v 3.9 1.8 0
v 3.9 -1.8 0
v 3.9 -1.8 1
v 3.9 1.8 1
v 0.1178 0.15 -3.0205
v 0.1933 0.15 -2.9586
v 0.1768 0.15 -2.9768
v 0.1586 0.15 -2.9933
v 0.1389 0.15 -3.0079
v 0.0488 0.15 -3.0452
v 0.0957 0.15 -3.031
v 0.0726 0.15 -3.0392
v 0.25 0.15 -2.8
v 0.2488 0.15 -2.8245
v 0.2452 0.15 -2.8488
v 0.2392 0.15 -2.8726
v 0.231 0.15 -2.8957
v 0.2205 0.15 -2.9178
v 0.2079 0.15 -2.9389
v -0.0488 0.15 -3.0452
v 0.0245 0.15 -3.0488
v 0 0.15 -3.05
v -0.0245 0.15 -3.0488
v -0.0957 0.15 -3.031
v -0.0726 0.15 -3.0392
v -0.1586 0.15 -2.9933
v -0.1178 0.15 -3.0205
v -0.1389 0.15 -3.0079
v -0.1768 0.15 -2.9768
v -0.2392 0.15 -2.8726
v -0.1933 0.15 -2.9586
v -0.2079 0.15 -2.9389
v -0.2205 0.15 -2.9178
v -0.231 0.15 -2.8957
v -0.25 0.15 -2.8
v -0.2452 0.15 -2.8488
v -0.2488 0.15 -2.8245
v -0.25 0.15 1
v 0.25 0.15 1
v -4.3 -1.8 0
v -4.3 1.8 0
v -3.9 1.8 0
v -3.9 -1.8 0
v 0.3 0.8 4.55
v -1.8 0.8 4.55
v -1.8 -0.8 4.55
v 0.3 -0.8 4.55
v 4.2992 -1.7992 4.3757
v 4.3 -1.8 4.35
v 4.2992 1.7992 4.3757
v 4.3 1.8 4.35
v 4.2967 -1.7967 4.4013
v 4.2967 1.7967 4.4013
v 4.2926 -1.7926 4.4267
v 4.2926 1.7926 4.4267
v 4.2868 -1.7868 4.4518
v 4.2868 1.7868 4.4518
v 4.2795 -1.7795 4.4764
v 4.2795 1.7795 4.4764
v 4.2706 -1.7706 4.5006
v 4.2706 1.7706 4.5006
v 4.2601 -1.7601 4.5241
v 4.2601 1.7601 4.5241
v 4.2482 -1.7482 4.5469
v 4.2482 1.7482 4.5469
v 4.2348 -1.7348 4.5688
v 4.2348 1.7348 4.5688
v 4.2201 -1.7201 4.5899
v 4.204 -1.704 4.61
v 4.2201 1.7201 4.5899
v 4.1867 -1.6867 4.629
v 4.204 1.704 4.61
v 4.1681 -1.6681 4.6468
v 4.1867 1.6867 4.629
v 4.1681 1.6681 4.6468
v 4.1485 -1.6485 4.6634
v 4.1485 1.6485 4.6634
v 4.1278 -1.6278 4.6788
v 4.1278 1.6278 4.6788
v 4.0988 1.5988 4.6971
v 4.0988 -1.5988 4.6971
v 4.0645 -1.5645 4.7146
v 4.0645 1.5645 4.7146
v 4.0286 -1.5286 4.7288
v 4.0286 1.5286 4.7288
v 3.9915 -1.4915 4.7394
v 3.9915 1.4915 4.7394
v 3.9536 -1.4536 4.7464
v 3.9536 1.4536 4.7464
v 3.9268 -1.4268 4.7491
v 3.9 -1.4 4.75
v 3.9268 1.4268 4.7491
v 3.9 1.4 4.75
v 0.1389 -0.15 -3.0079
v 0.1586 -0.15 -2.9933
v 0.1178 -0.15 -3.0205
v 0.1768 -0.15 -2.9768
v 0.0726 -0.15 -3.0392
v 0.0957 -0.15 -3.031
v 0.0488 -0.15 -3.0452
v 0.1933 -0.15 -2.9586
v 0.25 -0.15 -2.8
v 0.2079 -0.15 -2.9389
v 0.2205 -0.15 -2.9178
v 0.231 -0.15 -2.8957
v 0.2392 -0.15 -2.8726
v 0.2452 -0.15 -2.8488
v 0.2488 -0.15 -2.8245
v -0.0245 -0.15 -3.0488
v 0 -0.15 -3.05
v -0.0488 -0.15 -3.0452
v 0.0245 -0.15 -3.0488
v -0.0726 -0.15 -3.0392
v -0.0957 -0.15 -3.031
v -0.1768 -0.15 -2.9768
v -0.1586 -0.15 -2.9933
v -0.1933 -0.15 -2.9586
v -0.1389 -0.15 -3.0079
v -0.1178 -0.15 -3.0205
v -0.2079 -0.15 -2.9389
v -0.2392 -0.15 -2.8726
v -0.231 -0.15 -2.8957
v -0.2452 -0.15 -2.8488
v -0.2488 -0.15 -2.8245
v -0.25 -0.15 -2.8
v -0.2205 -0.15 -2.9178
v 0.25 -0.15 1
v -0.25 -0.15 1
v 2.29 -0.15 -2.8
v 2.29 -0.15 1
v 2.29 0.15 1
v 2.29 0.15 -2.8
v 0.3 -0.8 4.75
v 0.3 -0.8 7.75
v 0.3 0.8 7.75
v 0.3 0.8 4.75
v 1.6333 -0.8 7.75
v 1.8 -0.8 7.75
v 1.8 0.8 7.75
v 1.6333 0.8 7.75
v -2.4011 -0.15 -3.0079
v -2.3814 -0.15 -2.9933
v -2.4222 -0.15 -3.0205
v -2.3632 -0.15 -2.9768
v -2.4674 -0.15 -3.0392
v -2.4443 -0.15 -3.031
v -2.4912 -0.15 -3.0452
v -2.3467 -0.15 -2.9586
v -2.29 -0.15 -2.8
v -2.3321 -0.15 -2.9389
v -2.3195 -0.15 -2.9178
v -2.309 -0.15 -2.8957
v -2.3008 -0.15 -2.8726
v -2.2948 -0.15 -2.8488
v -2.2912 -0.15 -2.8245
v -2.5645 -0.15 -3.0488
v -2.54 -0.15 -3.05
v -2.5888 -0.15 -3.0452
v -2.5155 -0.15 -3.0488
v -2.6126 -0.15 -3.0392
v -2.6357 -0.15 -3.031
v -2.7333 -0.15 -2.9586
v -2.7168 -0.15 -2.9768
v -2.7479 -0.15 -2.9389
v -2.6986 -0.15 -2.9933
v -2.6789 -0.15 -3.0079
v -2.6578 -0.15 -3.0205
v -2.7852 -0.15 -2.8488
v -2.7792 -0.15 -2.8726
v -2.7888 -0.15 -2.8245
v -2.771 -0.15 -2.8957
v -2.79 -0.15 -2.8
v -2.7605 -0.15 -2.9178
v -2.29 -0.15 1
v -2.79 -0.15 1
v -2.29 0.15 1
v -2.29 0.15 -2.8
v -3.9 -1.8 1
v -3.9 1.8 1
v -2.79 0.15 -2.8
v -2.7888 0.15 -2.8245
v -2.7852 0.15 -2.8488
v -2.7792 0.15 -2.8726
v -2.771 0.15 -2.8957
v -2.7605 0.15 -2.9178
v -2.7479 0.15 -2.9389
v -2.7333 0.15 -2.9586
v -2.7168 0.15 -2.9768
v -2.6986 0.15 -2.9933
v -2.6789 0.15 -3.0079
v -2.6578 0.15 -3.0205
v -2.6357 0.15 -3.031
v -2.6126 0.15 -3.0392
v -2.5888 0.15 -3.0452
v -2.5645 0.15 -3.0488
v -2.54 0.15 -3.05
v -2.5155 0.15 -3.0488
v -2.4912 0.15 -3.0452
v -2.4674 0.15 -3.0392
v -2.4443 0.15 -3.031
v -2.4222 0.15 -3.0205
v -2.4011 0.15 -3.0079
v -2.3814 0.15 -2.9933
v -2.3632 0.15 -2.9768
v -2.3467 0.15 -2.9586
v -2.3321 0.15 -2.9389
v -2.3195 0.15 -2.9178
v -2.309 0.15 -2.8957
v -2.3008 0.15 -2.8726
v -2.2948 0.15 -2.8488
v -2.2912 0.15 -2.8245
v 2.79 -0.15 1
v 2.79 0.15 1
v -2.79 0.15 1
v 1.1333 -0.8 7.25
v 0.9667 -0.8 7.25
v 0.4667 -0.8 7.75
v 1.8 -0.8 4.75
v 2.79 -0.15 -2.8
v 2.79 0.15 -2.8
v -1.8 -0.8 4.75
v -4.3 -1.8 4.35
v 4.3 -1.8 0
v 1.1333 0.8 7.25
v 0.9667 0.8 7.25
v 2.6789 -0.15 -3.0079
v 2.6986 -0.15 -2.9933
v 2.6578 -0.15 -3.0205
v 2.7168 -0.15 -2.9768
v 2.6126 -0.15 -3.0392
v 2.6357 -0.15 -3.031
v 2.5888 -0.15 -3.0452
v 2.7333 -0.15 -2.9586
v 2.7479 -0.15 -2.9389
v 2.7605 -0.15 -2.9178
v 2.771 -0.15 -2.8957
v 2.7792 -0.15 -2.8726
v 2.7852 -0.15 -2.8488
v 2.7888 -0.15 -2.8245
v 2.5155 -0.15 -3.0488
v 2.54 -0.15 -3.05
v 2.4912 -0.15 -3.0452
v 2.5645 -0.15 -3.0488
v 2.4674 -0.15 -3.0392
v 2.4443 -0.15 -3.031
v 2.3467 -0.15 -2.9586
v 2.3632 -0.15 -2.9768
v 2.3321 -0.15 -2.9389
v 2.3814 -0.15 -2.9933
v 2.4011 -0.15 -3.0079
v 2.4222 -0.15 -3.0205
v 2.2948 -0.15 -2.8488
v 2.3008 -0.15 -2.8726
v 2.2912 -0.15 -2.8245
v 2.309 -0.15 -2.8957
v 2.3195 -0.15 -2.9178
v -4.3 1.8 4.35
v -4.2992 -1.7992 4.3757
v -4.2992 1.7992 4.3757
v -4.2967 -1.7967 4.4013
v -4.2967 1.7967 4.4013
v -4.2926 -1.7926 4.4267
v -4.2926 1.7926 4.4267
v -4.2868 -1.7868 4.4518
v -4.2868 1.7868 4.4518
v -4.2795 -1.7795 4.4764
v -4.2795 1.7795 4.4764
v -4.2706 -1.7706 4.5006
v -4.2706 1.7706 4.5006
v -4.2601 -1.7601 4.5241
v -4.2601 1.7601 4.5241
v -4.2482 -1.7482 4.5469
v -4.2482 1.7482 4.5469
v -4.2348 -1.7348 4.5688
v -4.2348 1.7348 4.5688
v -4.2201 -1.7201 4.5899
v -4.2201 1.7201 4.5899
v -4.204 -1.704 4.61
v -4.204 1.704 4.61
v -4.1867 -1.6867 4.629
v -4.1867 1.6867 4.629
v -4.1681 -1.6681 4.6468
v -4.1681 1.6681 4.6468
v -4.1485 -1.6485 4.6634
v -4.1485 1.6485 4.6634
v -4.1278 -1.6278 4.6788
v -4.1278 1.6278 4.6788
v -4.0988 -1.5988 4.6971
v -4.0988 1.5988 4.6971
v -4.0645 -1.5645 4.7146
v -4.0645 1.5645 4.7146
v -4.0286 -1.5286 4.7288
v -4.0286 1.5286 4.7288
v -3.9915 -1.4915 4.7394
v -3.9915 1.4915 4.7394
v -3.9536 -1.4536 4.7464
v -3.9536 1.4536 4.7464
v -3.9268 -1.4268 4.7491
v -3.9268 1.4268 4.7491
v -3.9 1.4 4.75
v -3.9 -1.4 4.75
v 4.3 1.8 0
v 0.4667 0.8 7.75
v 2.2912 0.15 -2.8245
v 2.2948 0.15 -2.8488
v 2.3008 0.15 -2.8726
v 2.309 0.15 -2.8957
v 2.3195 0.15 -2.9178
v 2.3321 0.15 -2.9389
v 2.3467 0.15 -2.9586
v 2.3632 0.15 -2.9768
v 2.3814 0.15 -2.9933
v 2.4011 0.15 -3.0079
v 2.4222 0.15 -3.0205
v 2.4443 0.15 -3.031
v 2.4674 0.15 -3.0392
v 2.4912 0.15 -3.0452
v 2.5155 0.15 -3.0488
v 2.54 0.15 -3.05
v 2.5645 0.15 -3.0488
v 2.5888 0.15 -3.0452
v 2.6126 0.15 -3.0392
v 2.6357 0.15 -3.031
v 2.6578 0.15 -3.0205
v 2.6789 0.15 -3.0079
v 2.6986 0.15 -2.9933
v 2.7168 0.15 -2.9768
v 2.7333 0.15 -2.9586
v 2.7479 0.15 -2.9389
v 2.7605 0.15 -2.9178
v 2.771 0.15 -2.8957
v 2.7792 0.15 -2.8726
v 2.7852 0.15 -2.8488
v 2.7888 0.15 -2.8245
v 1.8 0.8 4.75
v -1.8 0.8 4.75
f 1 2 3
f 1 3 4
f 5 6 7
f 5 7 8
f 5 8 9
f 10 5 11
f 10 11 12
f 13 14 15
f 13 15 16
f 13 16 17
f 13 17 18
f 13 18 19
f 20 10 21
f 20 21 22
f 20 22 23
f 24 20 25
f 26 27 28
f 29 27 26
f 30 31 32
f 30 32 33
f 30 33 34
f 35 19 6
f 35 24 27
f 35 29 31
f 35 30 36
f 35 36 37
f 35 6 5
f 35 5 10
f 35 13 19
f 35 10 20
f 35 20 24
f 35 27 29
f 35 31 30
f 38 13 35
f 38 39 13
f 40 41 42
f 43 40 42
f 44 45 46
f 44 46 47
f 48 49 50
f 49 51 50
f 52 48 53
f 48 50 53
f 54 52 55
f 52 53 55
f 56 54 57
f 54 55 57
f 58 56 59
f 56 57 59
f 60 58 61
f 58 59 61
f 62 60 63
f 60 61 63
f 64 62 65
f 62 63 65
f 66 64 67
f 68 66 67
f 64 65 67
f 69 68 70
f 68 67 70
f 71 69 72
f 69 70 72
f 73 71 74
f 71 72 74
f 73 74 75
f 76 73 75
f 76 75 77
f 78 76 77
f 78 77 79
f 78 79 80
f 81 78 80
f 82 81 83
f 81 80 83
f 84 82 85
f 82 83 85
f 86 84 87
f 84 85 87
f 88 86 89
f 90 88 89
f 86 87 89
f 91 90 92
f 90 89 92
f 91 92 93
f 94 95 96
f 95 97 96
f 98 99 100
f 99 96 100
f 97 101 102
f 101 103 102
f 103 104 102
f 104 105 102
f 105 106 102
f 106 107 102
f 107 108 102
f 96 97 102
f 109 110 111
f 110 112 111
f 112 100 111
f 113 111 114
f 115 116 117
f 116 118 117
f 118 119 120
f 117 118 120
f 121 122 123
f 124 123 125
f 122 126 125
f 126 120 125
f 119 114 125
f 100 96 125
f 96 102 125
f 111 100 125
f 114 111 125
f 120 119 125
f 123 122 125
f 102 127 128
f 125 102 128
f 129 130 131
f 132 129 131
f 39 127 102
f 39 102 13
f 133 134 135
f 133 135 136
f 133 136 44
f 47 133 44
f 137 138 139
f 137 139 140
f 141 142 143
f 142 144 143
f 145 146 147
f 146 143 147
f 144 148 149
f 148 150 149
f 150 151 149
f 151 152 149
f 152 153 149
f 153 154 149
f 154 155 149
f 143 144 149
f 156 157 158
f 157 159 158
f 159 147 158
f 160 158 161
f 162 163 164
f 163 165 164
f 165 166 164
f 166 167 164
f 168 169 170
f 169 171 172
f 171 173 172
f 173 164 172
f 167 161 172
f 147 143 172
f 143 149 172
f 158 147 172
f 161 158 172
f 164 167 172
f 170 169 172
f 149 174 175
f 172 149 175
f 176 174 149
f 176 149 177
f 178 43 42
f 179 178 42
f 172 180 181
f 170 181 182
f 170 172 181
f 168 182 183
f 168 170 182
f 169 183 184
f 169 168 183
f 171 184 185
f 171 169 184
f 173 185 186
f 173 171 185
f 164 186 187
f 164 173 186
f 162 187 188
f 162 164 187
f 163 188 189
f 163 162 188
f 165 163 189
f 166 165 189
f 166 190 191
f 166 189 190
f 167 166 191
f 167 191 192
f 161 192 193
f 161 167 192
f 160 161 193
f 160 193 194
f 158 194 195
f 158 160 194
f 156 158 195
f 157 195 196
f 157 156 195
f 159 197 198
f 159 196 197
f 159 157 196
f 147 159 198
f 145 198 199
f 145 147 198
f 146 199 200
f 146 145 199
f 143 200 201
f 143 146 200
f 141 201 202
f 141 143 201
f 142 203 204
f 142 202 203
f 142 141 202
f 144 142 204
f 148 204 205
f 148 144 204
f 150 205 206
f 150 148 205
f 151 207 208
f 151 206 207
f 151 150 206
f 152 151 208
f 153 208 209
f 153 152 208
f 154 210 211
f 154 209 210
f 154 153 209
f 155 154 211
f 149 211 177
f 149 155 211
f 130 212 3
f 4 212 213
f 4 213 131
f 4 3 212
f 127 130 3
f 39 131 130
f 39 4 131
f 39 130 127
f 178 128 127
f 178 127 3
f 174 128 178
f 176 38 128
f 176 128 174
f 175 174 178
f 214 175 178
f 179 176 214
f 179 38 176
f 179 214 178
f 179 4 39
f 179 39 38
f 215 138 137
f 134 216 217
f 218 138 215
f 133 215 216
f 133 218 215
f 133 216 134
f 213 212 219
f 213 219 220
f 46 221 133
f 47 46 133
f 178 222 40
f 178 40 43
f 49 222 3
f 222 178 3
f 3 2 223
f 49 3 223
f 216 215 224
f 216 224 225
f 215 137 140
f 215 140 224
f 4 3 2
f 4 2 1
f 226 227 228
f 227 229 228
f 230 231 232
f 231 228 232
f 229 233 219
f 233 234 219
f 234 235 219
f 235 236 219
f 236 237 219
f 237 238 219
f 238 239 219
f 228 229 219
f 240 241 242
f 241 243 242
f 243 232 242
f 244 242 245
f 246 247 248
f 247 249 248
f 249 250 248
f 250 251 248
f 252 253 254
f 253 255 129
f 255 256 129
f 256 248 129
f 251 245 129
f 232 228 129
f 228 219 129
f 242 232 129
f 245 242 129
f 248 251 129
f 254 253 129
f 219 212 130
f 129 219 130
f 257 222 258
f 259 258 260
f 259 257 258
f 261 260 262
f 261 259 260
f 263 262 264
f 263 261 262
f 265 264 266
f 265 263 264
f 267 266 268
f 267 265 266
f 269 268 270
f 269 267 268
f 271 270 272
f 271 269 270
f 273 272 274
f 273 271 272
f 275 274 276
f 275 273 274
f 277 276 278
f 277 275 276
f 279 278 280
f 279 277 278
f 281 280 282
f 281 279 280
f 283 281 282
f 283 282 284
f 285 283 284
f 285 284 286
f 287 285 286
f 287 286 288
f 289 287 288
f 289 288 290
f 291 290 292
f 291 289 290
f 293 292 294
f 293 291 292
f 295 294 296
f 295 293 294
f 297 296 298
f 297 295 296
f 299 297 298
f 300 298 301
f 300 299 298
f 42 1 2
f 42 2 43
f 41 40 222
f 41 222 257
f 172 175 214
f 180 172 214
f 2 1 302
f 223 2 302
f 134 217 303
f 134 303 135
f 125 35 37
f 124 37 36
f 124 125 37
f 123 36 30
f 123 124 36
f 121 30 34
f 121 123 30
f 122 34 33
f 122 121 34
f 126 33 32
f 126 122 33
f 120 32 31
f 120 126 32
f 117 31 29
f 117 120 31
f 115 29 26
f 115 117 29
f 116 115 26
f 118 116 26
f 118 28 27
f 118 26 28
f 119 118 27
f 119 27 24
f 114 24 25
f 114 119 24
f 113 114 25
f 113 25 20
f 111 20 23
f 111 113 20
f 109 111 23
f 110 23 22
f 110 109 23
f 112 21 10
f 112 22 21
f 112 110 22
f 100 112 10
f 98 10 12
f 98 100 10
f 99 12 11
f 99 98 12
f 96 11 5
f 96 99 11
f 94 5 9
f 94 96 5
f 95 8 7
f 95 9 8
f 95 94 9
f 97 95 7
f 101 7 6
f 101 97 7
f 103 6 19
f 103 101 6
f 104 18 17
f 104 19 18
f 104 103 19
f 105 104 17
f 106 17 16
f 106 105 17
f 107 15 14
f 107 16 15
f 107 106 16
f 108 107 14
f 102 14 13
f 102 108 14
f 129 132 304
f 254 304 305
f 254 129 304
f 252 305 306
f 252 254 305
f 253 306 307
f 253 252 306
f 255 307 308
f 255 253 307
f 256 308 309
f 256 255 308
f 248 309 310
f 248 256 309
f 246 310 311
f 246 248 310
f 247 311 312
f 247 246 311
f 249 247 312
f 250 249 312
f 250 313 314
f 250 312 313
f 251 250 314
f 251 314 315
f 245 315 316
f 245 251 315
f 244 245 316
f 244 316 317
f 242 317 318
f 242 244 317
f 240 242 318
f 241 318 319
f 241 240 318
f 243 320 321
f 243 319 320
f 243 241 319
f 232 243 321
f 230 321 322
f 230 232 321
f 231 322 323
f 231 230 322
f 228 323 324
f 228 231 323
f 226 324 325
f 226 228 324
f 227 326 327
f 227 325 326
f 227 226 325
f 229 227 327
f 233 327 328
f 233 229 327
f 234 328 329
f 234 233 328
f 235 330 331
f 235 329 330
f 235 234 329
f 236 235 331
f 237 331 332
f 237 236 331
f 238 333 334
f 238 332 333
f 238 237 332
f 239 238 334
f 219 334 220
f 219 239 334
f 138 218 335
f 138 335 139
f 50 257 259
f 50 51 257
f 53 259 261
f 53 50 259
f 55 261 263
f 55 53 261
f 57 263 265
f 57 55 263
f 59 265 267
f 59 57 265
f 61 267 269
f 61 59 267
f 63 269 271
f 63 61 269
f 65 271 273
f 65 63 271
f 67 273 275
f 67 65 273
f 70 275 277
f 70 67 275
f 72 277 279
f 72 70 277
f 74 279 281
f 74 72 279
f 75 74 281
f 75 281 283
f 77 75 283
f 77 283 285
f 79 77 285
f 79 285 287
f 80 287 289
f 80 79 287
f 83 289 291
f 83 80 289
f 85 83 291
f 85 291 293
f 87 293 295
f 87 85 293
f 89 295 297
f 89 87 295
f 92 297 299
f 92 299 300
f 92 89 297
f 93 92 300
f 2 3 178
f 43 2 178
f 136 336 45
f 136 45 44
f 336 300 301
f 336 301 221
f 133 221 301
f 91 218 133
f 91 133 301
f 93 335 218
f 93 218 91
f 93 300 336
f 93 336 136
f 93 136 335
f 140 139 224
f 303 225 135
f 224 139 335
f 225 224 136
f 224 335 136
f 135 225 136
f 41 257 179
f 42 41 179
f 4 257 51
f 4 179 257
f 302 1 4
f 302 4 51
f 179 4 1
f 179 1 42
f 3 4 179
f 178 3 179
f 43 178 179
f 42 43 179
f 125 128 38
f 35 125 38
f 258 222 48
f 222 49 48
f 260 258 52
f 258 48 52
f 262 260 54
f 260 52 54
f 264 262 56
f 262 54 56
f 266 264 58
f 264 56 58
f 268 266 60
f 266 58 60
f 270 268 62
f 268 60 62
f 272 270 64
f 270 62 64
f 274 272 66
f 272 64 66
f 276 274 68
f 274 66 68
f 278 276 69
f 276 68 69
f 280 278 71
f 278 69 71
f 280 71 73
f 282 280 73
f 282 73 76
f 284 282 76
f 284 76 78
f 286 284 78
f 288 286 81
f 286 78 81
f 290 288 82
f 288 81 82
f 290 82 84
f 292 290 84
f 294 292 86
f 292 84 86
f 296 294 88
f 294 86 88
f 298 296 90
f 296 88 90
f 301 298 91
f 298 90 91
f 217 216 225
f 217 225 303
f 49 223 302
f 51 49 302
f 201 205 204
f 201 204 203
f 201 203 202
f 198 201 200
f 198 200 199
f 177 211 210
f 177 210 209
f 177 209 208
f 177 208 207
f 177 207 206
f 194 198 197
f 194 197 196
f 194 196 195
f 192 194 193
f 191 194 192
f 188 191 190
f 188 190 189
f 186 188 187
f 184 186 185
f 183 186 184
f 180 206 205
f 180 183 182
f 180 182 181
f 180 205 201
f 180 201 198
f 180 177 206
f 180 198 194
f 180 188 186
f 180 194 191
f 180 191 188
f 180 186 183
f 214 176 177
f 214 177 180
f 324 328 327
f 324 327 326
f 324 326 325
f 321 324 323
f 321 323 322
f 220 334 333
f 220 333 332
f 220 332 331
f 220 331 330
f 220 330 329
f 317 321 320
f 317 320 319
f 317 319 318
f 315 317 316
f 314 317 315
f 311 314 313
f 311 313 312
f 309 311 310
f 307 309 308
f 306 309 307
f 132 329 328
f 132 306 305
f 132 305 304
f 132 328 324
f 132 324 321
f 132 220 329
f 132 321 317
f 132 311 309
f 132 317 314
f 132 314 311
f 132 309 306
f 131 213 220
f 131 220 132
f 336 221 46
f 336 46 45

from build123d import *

# Parameters (mm, degrees)
SKETCH1_W                         = 8.6
SKETCH1_H                         = 3.6
BOSS_EXTRUDE1_DEPTH               = 4.75
FILLET2_R                         = 0.4
SKETCH2_W                         = 3.6
SKETCH2_H                         = 1.6
CUT_EXTRUDE1_DEPTH                = 0.2
BOSS_EXTRUDE2_DEPTH               = 1.6
SKETCH8_W                         = 7.8
SKETCH8_H                         = 3.6
CUT_EXTRUDE2_DEPTH                = 1
SKETCH10_W                        = 0.5
SKETCH10_H                        = 0.3
BOSS_EXTRUDE6_DEPTH               = 4.05
FILLET5_RADIUS                    = 0.25
FILLET5_LENGTH                    = 0.3
LPATTERN3_COUNT                   = 2
LPATTERN3_PITCH                   = 2.54
FILLET5_OF_LPATTERN3_2_RADIUS     = 0.25
FILLET5_OF_LPATTERN3_2_LENGTH     = 0.3
LPATTERN3_COL_COUNT               = 2
LPATTERN3_COL_PITCH               = 2.54
FILLET5_OF_LPATTERN3_COL_2_RADIUS = 0.25
FILLET5_OF_LPATTERN3_COL_2_LENGTH = 0.3
SKETCH9_W                         = 7.8
SKETCH9_H                         = 3.6
BOSS_EXTRUDE7_DEPTH               = 1


with BuildPart() as part:
    # Sketch1 → Boss-Extrude1 (new body)
    with BuildSketch(Plane.XY):
        Rectangle(SKETCH1_W, SKETCH1_H)
    extrude(amount=BOSS_EXTRUDE1_DEPTH)

    # Fillet2
    fillet2_edges = [part.edges().sort_by_distance(p)[0] for p in [
        (-4.3, 0, 4.75),
        (0, -1.8, 4.75),
        (4.3, 0, 4.75),
        (0, 1.8, 4.75),
    ]]
    fillet(fillet2_edges, radius=FILLET2_R)

    # Sketch2 → Cut-Extrude1 (cut)
    with BuildSketch(Plane.XY.offset(4.75)):
        Rectangle(SKETCH2_W, SKETCH2_H)
    extrude(amount=-CUT_EXTRUDE1_DEPTH, mode=Mode.SUBTRACT)

    # Sketch4 → Boss-Extrude2 (add)
    with BuildSketch(Plane(origin=(0, -0.8, 0), x_dir=(1, 0, 0), z_dir=(0, 1, 0))):
        Polygon((1.8, -4.55), (1.8, -7.75), (1.633333333, -7.75), (1.133333333, -7.25), (0.966666667, -7.25), (0.466666667, -7.75), (0.3, -7.75), (0.3, -4.55), align=None)
    extrude(amount=BOSS_EXTRUDE2_DEPTH)

    # Sketch8 → Cut-Extrude2 (cut)
    with BuildSketch(Plane(origin=(0, 0, 0), x_dir=(-1, 0, 0), z_dir=(0, 0, -1))):
        Rectangle(SKETCH8_W, SKETCH8_H)
    extrude(amount=-CUT_EXTRUDE2_DEPTH, mode=Mode.SUBTRACT)

    # Sketch10 → Boss-Extrude6 (add)
    with BuildSketch(Plane(origin=(0, 0, 1), x_dir=(-1, 0, 0), z_dir=(0, 0, -1))):
        Rectangle(SKETCH10_W, SKETCH10_H)
    boss_extrude6 = extrude(amount=BOSS_EXTRUDE6_DEPTH)

    # Fillet5: full round fillet: the end face becomes a half cylinder, R = half its width
    fillet5_face = Plane((0, 0, -3.05), x_dir=(0, -1, 0), z_dir=(0, 0, -1))  # on the end face: x along it, z out of the body
    fillet5_slab = fillet5_face.offset(-FILLET5_RADIUS / 2) * Box(FILLET5_LENGTH, 2 * FILLET5_RADIUS, FILLET5_RADIUS, mode=Mode.PRIVATE)  # the body's end, R deep
    fillet5_round = Plane((0, 0, -2.8), x_dir=(0, 0, -1), z_dir=(0, -1, 0)) * Cylinder(FILLET5_RADIUS, FILLET5_LENGTH, mode=Mode.PRIVATE)  # its axis R under the face
    add(fillet5_slab - fillet5_round, mode=Mode.SUBTRACT)

    # LPattern3: Boss-Extrude6 ×2
    with Locations(*[(i * LPATTERN3_PITCH, 0, 0) for i in range(1, LPATTERN3_COUNT)]):
        add(boss_extrude6)

    # Fillet5 of LPattern3 2: full round fillet: the end face becomes a half cylinder, R = half its width
    fillet5_of_lpattern3_2_face = Plane((2.54, 0, -3.05), x_dir=(0, -1, 0), z_dir=(0, 0, -1))  # on the end face: x along it, z out of the body
    fillet5_of_lpattern3_2_slab = fillet5_of_lpattern3_2_face.offset(-FILLET5_OF_LPATTERN3_2_RADIUS / 2) * Box(FILLET5_OF_LPATTERN3_2_LENGTH, 2 * FILLET5_OF_LPATTERN3_2_RADIUS, FILLET5_OF_LPATTERN3_2_RADIUS, mode=Mode.PRIVATE)  # the body's end, R deep
    fillet5_of_lpattern3_2_round = Plane((2.54, 0, -2.8), x_dir=(0, 0, -1), z_dir=(0, -1, 0)) * Cylinder(FILLET5_OF_LPATTERN3_2_RADIUS, FILLET5_OF_LPATTERN3_2_LENGTH, mode=Mode.PRIVATE)  # its axis R under the face
    add(fillet5_of_lpattern3_2_slab - fillet5_of_lpattern3_2_round, mode=Mode.SUBTRACT)

    # LPattern3 col: Boss-Extrude6 ×2
    with Locations(*[(-i * LPATTERN3_COL_PITCH, 0, 0) for i in range(1, LPATTERN3_COL_COUNT)]):
        add(boss_extrude6)

    # Fillet5 of LPattern3 col 2: full round fillet: the end face becomes a half cylinder, R = half its width
    fillet5_of_lpattern3_col_2_face = Plane((-2.54, 0, -3.05), x_dir=(0, -1, 0), z_dir=(0, 0, -1))  # on the end face: x along it, z out of the body
    fillet5_of_lpattern3_col_2_slab = fillet5_of_lpattern3_col_2_face.offset(-FILLET5_OF_LPATTERN3_COL_2_RADIUS / 2) * Box(FILLET5_OF_LPATTERN3_COL_2_LENGTH, 2 * FILLET5_OF_LPATTERN3_COL_2_RADIUS, FILLET5_OF_LPATTERN3_COL_2_RADIUS, mode=Mode.PRIVATE)  # the body's end, R deep
    fillet5_of_lpattern3_col_2_round = Plane((-2.54, 0, -2.8), x_dir=(0, 0, -1), z_dir=(0, -1, 0)) * Cylinder(FILLET5_OF_LPATTERN3_COL_2_RADIUS, FILLET5_OF_LPATTERN3_COL_2_LENGTH, mode=Mode.PRIVATE)  # its axis R under the face
    add(fillet5_of_lpattern3_col_2_slab - fillet5_of_lpattern3_col_2_round, mode=Mode.SUBTRACT)


with BuildPart() as body_2:
    # Sketch9 → Boss-Extrude7 (new body)
    with BuildSketch(Plane(origin=(0, 0, 1), x_dir=(-1, 0, 0), z_dir=(0, 0, -1))):
        Rectangle(SKETCH9_W, SKETCH9_H)
    extrude(amount=BOSS_EXTRUDE7_DEPTH)


solid = Compound([part.part, body_2.part])
